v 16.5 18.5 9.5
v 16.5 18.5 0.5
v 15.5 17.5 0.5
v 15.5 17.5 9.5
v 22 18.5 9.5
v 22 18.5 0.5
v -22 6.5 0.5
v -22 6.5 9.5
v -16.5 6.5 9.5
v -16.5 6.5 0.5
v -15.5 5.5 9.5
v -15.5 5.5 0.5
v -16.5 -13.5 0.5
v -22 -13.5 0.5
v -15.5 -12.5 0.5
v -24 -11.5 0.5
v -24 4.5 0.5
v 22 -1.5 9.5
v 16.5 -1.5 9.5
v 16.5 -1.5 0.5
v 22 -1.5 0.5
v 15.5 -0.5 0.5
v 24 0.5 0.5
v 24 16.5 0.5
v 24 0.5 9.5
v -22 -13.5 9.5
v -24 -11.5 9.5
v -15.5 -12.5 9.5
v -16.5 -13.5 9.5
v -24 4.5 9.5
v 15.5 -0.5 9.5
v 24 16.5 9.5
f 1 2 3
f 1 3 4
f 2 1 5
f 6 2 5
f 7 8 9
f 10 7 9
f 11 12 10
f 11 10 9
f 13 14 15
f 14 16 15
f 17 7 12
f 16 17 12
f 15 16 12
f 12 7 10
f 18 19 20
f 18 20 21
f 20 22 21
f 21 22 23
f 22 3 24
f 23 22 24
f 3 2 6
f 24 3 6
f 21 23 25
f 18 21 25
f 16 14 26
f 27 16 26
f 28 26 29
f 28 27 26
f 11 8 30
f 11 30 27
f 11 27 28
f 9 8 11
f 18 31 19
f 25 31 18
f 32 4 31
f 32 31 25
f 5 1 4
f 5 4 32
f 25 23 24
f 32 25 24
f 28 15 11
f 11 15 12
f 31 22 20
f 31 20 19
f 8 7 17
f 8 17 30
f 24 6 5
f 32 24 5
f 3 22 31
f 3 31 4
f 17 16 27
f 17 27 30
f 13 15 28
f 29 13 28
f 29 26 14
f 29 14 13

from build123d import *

# Parameters (mm, degrees)
BOX020_W                                      = 8.5
BOX020_H                                      = 20
BOX020_DEPTH                                  = 9
BOX021_W                                      = 8.5
BOX021_H                                      = 20
BOX021_DEPTH                                  = 9
CHAMFER005021077002006007019003032007003_SIZE = 2
CHAMFER005021077002006007019003032007004_SIZE = 1


with BuildPart() as cube018:
    # Box020 → Box020 (new body)
    with BuildSketch(Plane(origin=(15.5, -1.5, 0.5), x_dir=(1, 0, 0), z_dir=(0, 0, 1))):
        with Locations((4.25, 10)):
            Rectangle(BOX020_W, BOX020_H)
    extrude(amount=BOX020_DEPTH)


with BuildPart() as belt_block:
    # Box021 → Box021 (new body)
    with BuildSketch(Plane(origin=(-24, -13.5, 0.5), x_dir=(1, 0, 0), z_dir=(0, 0, 1))):
        with Locations((4.25, 10)):
            Rectangle(BOX021_W, BOX021_H)
    extrude(amount=BOX021_DEPTH)

    # Fusion001007011026003: union Cube018
    add(cube018.part)

    # Chamfer005021077002006007019003032007003
    chamfer005021077002006007019003032007003_edges = [belt_block.edges().sort_by_distance(p)[0] for p in [
        (-24, -13.5, 5),
        (-24, 6.5, 5),
        (24, -1.5, 5),
        (24, 18.5, 5),
    ]]
    chamfer(chamfer005021077002006007019003032007003_edges, length=CHAMFER005021077002006007019003032007003_SIZE)

    # Chamfer005021077002006007019003032007004
    chamfer005021077002006007019003032007004_edges = [belt_block.edges().sort_by_distance(p)[0] for p in [
        (-15.5, -13.5, 5),
        (-15.5, 6.5, 5),
        (15.5, 18.5, 5),
        (15.5, -1.5, 5),
    ]]
    chamfer(chamfer005021077002006007019003032007004_edges, length=CHAMFER005021077002006007019003032007004_SIZE)


solid = belt_block.part
